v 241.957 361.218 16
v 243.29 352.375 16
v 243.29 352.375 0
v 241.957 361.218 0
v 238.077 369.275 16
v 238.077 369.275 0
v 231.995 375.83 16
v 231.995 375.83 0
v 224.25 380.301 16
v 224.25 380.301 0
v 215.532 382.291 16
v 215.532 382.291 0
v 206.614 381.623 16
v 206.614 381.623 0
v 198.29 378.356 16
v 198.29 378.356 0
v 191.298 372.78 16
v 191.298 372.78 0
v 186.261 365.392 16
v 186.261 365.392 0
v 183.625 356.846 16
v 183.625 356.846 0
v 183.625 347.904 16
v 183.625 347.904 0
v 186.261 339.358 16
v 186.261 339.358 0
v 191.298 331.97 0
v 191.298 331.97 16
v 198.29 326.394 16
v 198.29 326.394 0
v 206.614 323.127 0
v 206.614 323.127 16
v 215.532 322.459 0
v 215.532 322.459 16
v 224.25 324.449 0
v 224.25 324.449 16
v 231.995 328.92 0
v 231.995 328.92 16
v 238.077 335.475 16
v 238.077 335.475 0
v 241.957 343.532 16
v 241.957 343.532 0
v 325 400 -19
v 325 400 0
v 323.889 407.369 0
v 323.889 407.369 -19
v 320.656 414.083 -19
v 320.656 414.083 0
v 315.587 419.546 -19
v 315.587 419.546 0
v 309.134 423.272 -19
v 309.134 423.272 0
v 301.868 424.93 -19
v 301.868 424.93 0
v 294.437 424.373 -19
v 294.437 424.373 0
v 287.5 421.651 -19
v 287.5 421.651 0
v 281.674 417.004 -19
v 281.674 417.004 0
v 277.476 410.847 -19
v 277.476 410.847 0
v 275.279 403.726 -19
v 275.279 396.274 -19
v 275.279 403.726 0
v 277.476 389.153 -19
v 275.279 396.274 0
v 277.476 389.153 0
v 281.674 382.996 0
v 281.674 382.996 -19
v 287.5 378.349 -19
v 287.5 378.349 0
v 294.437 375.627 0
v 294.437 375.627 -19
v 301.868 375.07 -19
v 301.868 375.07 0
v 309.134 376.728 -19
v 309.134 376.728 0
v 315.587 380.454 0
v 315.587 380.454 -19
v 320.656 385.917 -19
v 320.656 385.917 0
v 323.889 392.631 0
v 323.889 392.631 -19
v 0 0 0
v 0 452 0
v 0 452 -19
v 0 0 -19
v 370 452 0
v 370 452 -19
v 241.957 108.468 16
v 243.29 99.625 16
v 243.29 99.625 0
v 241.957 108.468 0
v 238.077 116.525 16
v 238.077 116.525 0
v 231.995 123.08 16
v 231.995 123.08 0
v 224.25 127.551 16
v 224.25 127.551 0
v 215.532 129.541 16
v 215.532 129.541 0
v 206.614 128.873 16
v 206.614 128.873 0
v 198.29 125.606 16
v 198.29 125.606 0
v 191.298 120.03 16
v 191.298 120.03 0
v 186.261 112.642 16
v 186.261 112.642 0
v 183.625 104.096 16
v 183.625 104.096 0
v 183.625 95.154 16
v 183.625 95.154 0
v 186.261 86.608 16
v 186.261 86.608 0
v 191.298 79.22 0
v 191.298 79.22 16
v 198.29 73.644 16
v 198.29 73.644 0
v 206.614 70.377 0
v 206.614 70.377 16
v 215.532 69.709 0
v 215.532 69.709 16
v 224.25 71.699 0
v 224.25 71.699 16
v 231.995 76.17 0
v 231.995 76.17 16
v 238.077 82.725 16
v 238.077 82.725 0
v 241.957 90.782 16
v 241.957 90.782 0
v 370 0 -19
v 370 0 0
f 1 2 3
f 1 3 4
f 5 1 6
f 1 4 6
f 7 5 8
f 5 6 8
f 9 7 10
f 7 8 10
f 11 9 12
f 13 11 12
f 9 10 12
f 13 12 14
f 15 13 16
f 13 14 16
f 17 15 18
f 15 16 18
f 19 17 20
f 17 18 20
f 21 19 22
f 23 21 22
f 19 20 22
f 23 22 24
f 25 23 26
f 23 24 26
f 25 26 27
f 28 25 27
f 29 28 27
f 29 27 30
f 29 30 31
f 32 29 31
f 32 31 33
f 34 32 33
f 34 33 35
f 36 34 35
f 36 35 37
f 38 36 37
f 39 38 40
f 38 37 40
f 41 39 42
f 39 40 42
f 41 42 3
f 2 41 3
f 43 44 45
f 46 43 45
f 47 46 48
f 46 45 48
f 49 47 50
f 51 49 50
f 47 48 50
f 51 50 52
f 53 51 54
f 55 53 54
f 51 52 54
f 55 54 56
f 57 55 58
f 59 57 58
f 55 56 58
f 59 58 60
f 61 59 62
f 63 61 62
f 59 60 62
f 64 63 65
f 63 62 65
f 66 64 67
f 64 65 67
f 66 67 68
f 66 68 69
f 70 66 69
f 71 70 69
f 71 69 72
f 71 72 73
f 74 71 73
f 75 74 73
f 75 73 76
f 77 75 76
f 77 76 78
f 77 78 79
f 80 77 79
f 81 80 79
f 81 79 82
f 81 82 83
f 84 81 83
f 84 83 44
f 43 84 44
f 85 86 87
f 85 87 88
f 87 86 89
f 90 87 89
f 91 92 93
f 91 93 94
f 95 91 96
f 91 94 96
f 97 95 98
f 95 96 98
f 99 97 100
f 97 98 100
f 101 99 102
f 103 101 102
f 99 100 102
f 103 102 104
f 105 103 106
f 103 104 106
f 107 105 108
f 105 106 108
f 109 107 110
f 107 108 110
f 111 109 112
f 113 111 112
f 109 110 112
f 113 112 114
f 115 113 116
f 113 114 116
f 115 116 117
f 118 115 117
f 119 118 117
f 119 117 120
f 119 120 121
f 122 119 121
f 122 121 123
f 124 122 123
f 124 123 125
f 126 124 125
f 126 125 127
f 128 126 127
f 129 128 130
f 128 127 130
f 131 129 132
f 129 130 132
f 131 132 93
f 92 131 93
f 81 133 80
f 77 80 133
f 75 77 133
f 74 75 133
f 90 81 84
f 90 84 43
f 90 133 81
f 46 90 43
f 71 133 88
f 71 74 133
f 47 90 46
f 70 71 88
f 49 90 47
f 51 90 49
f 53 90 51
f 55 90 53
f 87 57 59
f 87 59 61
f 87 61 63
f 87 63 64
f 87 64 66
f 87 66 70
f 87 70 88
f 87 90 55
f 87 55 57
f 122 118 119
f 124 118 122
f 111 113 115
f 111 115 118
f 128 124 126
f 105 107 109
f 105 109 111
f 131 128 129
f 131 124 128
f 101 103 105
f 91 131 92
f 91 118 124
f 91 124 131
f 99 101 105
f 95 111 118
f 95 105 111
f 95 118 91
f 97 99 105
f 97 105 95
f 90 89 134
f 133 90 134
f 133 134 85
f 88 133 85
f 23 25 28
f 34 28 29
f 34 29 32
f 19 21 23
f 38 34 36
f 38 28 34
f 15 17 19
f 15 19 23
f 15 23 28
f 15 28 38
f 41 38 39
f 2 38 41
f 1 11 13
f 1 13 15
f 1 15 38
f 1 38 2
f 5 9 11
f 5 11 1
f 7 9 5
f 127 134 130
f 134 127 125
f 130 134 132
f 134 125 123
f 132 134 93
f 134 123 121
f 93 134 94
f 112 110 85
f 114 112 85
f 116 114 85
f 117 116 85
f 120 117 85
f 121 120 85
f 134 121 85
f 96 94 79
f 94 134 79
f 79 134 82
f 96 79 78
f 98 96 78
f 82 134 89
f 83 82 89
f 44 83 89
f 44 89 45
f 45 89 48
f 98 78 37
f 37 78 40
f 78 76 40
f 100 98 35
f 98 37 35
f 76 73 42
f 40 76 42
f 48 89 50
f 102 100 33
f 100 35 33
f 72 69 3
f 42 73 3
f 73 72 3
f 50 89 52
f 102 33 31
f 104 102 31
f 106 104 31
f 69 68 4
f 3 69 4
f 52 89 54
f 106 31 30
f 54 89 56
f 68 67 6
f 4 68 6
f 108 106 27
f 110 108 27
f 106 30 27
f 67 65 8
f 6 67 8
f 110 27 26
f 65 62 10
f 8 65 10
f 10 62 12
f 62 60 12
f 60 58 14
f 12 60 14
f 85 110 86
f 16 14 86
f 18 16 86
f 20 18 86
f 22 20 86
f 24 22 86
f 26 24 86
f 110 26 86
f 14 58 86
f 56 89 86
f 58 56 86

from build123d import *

# Parameters (mm, degrees)
PAD_DEPTH    = 19
SKETCH002_R  = 25
POCKET_DEPTH = 19.001
SKETCH003_R  = 30
PAD001_DEPTH = 16


with BuildPart() as part:
    # Sketch → Pad (new body)
    with BuildSketch(Plane.XY):
        Polygon((0, 413.879036), (0, 452), (370, 452), (370, 0), (0, 0), align=None)
    extrude(amount=-PAD_DEPTH)

    # Sketch002 (on Face6 of Pad) → Pocket (cut, through all)
    with BuildSketch(Plane.XY):
        with Locations((300, 400)):
            Circle(SKETCH002_R)
    extrude(amount=-POCKET_DEPTH, mode=Mode.SUBTRACT)

    # Sketch003 (on Face4 of Pocket) → Pad001 (join)
    with BuildSketch(Plane.XY):
        with Locations((213.29, 352.375)):
            Circle(SKETCH003_R)
        with Locations((213.29, 99.625)):
            Circle(SKETCH003_R)
    extrude(amount=PAD001_DEPTH)


solid = part.part
